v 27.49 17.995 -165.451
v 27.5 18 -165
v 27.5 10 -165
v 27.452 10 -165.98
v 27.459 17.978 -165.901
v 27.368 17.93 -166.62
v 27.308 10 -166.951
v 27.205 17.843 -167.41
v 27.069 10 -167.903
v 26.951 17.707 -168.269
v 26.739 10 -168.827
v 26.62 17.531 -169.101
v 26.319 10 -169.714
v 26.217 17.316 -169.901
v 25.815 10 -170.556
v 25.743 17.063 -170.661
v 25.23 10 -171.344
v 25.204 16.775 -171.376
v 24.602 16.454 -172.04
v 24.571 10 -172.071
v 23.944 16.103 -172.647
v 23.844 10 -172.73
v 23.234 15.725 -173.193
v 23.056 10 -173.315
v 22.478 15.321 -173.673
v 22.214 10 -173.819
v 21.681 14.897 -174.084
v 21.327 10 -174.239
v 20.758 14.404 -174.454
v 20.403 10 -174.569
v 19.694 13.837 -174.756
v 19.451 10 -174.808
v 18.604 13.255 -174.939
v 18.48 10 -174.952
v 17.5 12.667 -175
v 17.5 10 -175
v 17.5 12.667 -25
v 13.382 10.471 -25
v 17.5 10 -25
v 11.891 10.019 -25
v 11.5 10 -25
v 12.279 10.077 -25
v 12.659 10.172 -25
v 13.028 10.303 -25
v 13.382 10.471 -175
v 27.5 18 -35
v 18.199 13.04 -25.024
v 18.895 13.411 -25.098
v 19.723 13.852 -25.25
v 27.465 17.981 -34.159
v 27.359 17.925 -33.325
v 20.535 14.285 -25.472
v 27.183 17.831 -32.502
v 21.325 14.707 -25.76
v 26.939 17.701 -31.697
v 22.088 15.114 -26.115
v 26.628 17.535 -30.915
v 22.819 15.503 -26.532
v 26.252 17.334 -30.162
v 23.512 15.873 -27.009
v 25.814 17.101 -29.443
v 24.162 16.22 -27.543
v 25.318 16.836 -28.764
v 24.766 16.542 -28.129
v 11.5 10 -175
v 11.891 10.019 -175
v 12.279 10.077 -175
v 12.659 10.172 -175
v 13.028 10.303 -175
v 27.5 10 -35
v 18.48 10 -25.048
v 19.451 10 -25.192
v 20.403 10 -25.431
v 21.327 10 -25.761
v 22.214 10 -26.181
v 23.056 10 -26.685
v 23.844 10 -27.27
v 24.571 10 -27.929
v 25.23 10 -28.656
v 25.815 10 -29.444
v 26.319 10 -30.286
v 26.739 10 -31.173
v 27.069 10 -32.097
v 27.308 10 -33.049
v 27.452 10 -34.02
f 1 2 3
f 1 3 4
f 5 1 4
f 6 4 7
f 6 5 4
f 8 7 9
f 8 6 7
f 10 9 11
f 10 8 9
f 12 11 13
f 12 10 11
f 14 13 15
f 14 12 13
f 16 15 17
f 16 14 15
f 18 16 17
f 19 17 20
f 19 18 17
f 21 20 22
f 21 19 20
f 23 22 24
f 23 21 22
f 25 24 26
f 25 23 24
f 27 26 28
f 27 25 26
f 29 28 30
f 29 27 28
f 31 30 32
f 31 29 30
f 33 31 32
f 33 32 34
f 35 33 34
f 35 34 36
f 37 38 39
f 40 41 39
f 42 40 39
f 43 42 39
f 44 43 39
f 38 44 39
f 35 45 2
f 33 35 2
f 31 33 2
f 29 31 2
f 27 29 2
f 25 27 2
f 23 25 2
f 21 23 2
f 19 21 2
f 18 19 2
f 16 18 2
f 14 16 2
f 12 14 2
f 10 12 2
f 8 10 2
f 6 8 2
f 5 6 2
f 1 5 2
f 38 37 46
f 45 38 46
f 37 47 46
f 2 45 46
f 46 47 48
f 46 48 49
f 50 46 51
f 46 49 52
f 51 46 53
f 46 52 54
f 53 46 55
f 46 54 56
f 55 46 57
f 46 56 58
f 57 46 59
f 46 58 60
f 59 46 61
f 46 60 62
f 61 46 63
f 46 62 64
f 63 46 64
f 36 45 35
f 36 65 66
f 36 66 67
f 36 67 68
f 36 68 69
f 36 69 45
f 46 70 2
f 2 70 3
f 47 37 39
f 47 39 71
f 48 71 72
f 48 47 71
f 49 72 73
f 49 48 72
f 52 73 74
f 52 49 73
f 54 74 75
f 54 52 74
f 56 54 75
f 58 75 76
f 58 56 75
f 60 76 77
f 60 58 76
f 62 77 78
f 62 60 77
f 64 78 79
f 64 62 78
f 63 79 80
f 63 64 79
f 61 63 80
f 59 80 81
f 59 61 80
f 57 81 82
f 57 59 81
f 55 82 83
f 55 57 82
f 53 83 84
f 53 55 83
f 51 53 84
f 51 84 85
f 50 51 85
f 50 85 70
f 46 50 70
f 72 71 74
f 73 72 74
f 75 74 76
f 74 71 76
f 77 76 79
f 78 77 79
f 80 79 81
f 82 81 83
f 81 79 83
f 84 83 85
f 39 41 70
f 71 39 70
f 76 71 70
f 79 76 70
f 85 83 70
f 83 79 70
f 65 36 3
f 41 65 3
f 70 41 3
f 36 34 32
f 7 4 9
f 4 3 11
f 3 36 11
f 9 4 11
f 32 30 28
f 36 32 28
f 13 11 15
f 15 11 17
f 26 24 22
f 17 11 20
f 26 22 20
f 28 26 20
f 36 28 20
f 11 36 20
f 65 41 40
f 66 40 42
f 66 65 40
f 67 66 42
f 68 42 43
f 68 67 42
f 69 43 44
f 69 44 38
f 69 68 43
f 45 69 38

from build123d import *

# Parameters (mm, degrees)
SKETCH1_W              = 40
SKETCH1_H              = 200
BOSS_EXTRUDE1_DEPTH    = 10
SKETCH2_W              = 15
SKETCH2_H              = 150
BOSS_EXTRUDE2_DEPTH    = 8
FILLET1_R              = 10
CUT_EXTRUDE1_DEPTH     = 205.753510348
FILLET2_R              = 4
SPLIT1_SURFACE_1_BACK  = 205.754
SPLIT1_SURFACE_1_DEPTH = 411.508


with BuildPart() as part:
    # Sketch1 → Boss-Extrude1 (new body)
    with BuildSketch(Plane(origin=(0, 0, 0), x_dir=(1, 0, 0), z_dir=(0, 1, 0))):
        with Locations((20, 100)):
            Rectangle(SKETCH1_W, SKETCH1_H)
    extrude(amount=BOSS_EXTRUDE1_DEPTH)

    # Sketch2 → Boss-Extrude2 (add)
    with BuildSketch(Plane(origin=(0, 10, 0), x_dir=(1, 0, 0), z_dir=(0, 1, 0))):
        with Locations((20, 100)):
            Rectangle(SKETCH2_W, SKETCH2_H)
    extrude(amount=BOSS_EXTRUDE2_DEPTH)

    # Fillet1
    fillet1_edges = [part.edges().sort_by_distance(p)[0] for p in [
        (27.5, 14, -25),
        (27.5, 14, -175),
    ]]
    fillet(fillet1_edges, radius=FILLET1_R)

    # Sketch3 → Cut-Extrude1 (cut, through all)
    with BuildSketch(Plane.XY):
        Polygon((27.5, 18), (12.5, 18), (12.5, 10), align=None)
    extrude(amount=-CUT_EXTRUDE1_DEPTH, mode=Mode.SUBTRACT)

    # Fillet2
    fillet2_edges = [part.edges().sort_by_distance(p)[0] for p in [
        (12.5, 10, -100),
    ]]
    fillet(fillet2_edges, radius=FILLET2_R)

    # Split1: cut with a surface, the side it looks to stays
    # Split1 surface: a surface, the sketch's curves swept straight by 411.508 mm
    with BuildLine(Plane.XY.offset(-SPLIT1_SURFACE_1_BACK), mode=Mode.PRIVATE) as split1_surface_1_path:
        Line((0, 10), (40, 10))
    split1_surface_1 = Shell.extrude(split1_surface_1_path.wire(), (0 * SPLIT1_SURFACE_1_DEPTH, 0 * SPLIT1_SURFACE_1_DEPTH, 1 * SPLIT1_SURFACE_1_DEPTH))
    split(bisect_by=split1_surface_1, keep=Keep.TOP)


solid = part.part
